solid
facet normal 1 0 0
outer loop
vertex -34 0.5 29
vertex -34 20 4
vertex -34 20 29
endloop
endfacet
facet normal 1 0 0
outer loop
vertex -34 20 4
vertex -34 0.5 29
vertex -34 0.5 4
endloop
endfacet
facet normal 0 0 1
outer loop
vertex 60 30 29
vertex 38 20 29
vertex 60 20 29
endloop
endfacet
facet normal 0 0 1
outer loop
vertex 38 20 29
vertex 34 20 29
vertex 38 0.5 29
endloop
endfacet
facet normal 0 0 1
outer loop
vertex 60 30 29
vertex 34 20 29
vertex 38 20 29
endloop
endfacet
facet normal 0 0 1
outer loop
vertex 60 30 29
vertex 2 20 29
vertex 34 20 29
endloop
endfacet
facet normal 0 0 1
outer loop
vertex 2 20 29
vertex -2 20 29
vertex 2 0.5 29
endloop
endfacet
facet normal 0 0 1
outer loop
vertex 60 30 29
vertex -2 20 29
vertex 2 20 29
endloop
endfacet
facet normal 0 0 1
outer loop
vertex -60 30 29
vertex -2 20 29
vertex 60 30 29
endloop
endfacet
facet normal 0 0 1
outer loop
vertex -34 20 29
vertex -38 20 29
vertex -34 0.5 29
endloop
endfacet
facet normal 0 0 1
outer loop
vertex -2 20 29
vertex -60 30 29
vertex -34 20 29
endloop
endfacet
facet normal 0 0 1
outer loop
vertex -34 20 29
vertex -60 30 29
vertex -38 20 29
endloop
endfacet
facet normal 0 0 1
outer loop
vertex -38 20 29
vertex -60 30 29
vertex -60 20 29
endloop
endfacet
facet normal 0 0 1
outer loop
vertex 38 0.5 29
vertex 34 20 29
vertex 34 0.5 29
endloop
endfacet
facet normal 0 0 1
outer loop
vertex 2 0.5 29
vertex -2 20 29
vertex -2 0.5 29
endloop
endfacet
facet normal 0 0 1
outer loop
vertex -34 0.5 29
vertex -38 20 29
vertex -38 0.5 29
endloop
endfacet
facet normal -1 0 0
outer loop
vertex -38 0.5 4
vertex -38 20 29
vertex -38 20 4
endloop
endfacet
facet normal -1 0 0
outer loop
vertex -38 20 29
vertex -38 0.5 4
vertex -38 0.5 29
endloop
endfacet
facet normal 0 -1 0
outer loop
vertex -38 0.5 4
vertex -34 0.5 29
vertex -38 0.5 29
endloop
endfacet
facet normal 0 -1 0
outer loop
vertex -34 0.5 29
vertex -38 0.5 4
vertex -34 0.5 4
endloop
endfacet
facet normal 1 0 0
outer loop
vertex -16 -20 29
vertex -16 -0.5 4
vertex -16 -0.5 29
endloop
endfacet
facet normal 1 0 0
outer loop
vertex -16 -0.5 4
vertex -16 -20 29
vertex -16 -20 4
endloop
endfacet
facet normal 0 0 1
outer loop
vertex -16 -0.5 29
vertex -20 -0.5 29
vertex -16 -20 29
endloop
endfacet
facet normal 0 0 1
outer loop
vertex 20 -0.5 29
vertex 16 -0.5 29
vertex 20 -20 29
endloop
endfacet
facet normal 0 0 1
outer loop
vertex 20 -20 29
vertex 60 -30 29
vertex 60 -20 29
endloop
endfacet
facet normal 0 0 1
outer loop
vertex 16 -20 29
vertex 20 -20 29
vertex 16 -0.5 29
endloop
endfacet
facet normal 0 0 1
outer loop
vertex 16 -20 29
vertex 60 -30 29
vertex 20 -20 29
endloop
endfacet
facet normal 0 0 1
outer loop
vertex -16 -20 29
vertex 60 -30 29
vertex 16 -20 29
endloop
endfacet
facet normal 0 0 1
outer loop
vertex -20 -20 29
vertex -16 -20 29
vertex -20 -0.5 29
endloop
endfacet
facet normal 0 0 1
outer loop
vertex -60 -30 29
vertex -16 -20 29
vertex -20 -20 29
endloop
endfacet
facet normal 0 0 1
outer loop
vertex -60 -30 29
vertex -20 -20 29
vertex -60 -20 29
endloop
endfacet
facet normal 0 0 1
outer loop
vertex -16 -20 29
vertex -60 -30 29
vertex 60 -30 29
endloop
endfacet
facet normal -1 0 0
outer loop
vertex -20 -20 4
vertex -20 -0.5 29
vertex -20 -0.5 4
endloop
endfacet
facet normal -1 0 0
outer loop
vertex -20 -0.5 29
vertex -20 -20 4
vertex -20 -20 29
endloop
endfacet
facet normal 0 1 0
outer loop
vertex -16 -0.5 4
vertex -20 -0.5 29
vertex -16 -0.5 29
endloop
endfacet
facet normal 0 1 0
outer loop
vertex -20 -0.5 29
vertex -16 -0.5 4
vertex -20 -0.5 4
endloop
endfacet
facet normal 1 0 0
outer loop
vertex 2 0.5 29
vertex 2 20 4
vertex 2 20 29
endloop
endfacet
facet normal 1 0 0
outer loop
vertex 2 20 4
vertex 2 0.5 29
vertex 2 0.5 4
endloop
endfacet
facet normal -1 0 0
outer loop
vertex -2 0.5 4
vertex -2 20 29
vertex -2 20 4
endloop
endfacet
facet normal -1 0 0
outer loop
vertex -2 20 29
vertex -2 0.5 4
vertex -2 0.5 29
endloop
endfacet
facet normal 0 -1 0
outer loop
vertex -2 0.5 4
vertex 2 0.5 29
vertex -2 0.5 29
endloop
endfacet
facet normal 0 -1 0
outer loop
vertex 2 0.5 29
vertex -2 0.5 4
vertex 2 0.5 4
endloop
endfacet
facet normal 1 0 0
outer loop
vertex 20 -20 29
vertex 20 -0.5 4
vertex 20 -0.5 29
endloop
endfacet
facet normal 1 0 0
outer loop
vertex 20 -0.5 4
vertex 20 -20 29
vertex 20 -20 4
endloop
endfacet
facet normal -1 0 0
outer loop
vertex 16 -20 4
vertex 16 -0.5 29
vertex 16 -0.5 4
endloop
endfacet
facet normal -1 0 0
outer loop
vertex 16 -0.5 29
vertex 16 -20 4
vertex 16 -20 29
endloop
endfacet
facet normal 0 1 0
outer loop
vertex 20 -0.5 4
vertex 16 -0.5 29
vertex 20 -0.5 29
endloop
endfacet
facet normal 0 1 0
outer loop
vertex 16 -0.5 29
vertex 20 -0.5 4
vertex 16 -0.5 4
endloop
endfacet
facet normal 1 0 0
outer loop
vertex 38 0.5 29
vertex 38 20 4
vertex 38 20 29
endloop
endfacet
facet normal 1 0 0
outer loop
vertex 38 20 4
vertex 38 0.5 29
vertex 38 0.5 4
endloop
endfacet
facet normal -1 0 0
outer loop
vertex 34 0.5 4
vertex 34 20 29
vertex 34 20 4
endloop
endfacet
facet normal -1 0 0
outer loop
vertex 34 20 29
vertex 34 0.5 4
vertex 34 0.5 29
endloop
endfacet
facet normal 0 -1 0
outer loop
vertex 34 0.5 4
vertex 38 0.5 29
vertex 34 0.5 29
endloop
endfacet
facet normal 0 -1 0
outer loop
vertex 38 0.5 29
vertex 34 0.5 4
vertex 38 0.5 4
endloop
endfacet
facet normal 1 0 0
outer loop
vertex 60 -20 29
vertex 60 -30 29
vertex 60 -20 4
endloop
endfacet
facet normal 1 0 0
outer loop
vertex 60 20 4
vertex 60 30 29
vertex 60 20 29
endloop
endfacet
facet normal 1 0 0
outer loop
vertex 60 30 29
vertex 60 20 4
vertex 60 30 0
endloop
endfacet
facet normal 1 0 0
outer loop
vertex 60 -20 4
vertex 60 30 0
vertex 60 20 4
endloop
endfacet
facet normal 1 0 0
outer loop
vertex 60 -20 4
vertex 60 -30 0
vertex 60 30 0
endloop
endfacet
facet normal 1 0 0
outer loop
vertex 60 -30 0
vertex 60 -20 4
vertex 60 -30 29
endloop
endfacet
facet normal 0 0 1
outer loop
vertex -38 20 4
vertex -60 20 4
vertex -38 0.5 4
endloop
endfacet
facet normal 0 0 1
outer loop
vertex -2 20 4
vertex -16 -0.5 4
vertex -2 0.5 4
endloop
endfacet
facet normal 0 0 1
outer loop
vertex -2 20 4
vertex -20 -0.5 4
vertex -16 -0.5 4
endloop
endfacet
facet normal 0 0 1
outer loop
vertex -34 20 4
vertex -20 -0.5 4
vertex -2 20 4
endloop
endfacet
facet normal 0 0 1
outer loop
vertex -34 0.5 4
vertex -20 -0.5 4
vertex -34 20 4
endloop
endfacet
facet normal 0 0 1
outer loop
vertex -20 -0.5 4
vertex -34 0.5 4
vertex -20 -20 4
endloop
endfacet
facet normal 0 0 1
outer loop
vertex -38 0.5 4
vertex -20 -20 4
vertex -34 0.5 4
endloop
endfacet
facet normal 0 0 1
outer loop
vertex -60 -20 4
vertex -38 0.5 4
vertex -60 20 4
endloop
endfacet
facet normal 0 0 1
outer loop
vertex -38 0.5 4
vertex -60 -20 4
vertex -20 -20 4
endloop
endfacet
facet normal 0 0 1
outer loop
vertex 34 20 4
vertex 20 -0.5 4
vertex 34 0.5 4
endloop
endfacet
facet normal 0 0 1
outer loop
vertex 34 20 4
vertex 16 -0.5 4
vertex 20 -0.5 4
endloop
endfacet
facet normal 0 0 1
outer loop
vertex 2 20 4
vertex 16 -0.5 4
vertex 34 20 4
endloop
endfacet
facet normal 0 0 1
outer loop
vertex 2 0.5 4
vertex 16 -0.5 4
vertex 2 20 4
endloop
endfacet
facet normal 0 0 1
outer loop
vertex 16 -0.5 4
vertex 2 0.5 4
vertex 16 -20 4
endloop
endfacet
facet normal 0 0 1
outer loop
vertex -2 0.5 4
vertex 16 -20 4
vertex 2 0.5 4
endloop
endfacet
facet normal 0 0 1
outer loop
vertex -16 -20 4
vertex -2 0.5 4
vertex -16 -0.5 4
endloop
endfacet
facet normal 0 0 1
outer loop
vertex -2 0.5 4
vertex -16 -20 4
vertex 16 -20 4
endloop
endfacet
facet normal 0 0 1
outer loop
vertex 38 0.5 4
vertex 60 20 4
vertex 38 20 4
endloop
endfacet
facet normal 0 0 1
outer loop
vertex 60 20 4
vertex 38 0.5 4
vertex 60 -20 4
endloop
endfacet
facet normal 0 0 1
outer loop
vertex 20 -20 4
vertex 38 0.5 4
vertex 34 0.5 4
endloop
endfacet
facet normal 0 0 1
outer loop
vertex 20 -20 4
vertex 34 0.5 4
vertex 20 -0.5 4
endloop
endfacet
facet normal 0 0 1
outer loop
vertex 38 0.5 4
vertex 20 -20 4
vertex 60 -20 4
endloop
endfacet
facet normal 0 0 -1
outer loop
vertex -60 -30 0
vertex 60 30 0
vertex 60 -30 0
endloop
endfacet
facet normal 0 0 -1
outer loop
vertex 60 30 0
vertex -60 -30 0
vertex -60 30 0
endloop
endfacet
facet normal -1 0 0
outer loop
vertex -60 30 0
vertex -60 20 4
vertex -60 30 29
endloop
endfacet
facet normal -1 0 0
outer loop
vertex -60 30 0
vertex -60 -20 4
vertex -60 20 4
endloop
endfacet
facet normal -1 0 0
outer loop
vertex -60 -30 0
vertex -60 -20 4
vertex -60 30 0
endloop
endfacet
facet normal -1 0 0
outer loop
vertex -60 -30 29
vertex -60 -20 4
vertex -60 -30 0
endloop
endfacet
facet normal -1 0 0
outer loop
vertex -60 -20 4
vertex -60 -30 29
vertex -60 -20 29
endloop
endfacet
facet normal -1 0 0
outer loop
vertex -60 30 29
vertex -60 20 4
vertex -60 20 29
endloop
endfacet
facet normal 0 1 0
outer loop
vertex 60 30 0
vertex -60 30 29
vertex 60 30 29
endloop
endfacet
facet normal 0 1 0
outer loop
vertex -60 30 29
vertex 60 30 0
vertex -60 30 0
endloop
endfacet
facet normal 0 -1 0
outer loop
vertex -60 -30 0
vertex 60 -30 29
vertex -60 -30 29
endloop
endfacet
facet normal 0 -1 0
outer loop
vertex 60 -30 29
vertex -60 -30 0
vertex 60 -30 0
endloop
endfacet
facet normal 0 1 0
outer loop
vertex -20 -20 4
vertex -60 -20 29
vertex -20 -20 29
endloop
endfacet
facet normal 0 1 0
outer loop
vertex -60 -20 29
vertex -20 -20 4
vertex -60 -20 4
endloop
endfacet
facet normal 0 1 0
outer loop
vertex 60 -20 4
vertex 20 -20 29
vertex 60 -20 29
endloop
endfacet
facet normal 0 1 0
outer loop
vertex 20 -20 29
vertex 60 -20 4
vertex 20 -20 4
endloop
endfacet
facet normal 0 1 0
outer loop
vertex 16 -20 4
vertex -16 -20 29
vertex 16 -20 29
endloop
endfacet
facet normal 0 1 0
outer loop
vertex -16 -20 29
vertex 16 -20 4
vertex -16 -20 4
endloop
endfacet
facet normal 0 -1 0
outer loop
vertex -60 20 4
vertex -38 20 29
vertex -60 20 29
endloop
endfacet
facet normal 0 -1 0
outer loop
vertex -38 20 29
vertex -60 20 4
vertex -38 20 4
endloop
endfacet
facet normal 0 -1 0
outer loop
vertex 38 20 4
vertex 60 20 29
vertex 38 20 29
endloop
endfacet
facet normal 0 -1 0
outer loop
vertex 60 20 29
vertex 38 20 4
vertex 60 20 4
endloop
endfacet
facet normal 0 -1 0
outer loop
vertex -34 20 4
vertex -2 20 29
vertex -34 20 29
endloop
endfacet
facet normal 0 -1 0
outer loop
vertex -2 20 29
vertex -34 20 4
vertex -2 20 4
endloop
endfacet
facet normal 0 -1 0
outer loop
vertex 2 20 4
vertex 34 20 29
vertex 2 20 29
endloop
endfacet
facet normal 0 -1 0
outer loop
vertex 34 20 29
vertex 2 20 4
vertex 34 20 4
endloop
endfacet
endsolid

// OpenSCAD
$fn = 32;

// ----------------------------------------------------------------------
// Rib frame 120 x 60 x 29
// 5 ribs at 18 mm pitch, staggered
// ----------------------------------------------------------------------

// --- parameters (mm) ---
frame = [120, 60, 4];  // base plate size (x, y, z)
rail_w = 10;           // side rail width
ribs = 5;              // number of ribs
rib_t = 4;             // rib thickness
rib_h = 25;            // rib height above the base plate
pitch = 18;            // pitch between rib centres

// --- derived feature positions (mm) ---
span = (ribs - 1) * pitch;          // = 72   distance between the outer ribs
origin_x = -span / 2;               // = -36   X of the first rib
rib_len = frame[1] / 2 - rail_w + 0.5;  // = 20.5   length of a staggered rib
rib_y = 0.5 + rib_len / 2;          // = 10.75   Y of a staggered rib centre
row_offset = 2 * rib_y;             // = 21.5   distance between the two rows
feature_centers = [
  [origin_x + 0 * pitch, rib_y],
  [origin_x + 1 * pitch, -rib_y],
  [origin_x + 2 * pitch, rib_y],
  [origin_x + 3 * pitch, -rib_y],
  [origin_x + 4 * pitch, rib_y]
];   // rib centre line, drives the rib loop

// base plate, two side rails, then the ribs read straight off feature_centers
union() {
  translate([-frame[0] / 2, -frame[1] / 2, 0]) cube(frame);
  translate([-frame[0] / 2, -frame[1] / 2, 0]) cube([frame[0], rail_w, frame[2] + rib_h]);
  translate([-frame[0] / 2, frame[1] / 2 - rail_w, 0]) cube([frame[0], rail_w, frame[2] + rib_h]);
  for (centre = feature_centers)
    translate([centre[0] - rib_t / 2, centre[1] - rib_len / 2, frame[2] - 1])
      cube([rib_t, rib_len, rib_h + 1]);
}
